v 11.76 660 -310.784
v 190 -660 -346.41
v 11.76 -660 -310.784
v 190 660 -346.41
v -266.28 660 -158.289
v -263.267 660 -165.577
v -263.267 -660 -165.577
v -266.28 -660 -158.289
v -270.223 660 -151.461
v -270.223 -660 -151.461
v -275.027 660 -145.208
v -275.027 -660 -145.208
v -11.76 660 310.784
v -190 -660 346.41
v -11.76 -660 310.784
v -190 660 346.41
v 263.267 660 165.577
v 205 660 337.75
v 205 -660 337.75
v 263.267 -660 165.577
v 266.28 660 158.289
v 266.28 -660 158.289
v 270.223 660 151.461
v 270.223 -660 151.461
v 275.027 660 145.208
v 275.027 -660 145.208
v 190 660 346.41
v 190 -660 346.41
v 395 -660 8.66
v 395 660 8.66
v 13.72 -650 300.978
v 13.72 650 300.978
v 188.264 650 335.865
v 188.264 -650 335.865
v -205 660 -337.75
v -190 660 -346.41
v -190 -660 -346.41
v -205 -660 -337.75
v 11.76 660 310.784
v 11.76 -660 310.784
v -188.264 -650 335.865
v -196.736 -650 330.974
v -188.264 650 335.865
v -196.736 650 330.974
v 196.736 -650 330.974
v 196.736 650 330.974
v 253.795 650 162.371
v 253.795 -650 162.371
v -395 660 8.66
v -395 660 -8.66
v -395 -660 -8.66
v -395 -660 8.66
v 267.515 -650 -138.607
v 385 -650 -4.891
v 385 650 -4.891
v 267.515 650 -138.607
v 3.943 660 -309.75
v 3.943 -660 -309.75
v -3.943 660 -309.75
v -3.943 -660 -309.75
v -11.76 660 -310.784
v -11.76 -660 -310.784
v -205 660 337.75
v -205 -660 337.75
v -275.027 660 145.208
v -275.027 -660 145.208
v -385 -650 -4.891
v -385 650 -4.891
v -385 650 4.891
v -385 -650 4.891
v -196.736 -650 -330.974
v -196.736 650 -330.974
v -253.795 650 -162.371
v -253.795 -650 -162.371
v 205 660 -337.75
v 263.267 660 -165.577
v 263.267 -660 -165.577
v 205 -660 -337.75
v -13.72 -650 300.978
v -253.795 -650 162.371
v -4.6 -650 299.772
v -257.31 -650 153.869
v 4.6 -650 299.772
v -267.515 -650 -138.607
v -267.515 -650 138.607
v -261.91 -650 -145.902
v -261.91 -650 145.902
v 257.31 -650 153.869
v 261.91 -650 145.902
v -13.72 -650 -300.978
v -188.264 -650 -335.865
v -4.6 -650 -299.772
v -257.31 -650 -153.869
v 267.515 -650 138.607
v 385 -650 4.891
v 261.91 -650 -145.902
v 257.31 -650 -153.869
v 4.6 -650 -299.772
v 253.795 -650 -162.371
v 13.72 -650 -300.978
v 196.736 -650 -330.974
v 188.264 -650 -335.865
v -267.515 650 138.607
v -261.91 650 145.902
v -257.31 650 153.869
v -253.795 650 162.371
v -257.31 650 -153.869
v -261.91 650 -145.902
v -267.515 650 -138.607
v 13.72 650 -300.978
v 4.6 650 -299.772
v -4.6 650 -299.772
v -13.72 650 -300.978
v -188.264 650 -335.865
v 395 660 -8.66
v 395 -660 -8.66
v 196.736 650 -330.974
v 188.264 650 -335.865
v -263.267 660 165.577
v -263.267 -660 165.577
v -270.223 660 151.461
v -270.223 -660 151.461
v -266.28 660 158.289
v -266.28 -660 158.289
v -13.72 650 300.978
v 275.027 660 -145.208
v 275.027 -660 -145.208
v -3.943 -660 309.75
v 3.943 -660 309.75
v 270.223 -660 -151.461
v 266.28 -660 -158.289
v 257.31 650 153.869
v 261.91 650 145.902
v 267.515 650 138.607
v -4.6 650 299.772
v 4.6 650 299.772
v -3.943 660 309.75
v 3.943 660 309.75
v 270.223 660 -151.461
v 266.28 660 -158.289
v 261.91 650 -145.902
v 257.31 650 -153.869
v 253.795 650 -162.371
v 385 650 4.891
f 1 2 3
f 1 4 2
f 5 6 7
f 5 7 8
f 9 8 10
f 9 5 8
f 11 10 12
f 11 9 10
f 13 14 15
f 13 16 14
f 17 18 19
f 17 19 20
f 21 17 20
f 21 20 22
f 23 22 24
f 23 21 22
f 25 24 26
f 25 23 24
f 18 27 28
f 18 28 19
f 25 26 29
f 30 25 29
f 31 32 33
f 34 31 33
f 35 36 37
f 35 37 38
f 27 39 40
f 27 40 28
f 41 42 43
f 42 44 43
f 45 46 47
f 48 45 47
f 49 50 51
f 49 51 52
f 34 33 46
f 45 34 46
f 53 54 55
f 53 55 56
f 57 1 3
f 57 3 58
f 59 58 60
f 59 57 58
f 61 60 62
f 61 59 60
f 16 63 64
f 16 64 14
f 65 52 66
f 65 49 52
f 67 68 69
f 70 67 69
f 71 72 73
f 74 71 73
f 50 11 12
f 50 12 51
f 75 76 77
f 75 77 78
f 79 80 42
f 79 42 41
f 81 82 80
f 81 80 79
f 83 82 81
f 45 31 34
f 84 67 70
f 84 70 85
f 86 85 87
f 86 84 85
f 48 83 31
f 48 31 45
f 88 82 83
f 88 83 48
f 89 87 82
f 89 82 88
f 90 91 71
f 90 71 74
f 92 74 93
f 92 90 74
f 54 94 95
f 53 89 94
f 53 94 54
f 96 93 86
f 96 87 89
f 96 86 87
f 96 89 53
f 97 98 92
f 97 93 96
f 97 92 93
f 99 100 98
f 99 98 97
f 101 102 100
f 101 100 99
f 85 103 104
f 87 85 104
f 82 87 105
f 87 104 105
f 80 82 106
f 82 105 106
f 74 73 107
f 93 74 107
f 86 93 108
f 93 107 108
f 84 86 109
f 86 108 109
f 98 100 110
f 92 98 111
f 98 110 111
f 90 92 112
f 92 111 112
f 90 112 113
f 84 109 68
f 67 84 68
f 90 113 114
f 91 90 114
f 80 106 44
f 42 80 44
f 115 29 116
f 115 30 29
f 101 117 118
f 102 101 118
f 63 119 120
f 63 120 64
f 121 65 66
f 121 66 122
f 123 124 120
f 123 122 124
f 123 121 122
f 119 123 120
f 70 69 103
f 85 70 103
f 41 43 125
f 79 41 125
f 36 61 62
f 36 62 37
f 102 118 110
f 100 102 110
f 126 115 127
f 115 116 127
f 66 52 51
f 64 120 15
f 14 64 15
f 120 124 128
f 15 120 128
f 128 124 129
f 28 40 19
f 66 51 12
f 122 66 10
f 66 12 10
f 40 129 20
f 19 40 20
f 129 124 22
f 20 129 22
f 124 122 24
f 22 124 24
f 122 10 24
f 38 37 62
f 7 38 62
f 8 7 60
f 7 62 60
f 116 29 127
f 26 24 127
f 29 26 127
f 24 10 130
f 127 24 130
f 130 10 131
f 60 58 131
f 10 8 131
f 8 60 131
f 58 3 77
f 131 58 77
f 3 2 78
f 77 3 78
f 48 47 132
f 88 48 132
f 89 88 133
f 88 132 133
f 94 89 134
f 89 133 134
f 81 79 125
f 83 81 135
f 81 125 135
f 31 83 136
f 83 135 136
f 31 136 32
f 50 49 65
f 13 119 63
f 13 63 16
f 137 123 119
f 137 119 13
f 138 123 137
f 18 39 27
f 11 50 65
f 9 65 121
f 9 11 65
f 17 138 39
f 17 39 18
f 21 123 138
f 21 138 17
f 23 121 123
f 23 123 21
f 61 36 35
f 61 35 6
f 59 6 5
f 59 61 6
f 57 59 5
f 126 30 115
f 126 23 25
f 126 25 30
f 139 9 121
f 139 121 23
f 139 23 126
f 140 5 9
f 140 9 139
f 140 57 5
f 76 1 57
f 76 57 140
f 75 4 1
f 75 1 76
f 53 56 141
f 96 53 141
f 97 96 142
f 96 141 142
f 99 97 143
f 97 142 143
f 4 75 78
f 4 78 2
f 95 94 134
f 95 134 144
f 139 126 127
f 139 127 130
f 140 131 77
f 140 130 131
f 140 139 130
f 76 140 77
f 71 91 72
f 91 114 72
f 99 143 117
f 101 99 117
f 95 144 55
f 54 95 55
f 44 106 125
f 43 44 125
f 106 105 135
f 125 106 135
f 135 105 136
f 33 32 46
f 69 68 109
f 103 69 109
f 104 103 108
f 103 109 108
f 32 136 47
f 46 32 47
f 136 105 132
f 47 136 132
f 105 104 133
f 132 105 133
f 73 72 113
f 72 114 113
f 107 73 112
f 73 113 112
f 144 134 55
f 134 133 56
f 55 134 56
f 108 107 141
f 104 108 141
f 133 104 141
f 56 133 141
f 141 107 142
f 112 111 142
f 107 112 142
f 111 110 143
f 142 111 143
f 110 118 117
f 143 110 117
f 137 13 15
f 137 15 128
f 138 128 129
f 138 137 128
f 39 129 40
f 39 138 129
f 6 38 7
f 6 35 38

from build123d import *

# Parameters (mm, degrees)
EXTRUDE_1_DEPTH          = 660
CUT_EXTRUDE_1_DEPTH      = 661
CUT_EXTRUDE_1_DEPTH_BACK = 661
SHELL_1_T                = 10


with BuildPart() as part:
    # 草图1 → 凸台-拉伸1 (new body, symmetric)
    with BuildSketch(Plane(origin=(0, 0, 0), x_dir=(1, 0, 0), z_dir=(0, 1, 0))):
        Polygon((395, 8.660254038), (205, 337.749907476), (190, 346.410161514), (-190, 346.410161514), (-205, 337.749907476), (-395, 8.660254038), (-395, -8.660254038), (-205, -337.749907476), (-190, -346.410161514), (190, -346.410161514), (205, -337.749907476), (395, -8.660254038), align=None)
    extrude(amount=EXTRUDE_1_DEPTH, both=True)

    # 草图4 → 切除-拉伸1 (cut, two sides)
    with BuildSketch(Plane(origin=(0, 0, 0), x_dir=(1, 0, 0), z_dir=(0, 1, 0))) as cut_extrude_1_sk:
        with BuildLine():
            Line((190, 369.620348729), (190, 346.410161514))
            Line((190, 346.410161514), (11.76, 310.784114995))
            ThreePointArc((11.76, 310.784114995), (0, 309.620348729), (-11.76, 310.784114995))
            Line((-11.76, 310.784114995), (-190, 346.410161514))
            Line((-190, 346.410161514), (-190, 369.620348729))
            Line((-190, 369.620348729), (-190, 392.830535944))
            Line((-190, 392.830535944), (-11.76, 428.456582463))
            ThreePointArc((-11.76, 428.456582463), (0, 429.620348729), (11.76, 428.456582463))
            Line((11.76, 428.456582463), (190, 392.830535944))
            Line((190, 392.830535944), (190, 369.620348729))
        make_face()
        with BuildLine():
            Line((415.100611755, 20.265347645), (395, 8.660254038))
            Line((395, 8.660254038), (275.026938678, 145.207598749))
            ThreePointArc((275.026938678, 145.207598749), (268.139087528, 154.810174364), (263.266938678, 165.576516246))
            Line((263.266938678, 165.576516246), (205, 337.749907476))
            Line((205, 337.749907476), (225.100611755, 349.355001084))
            Line((225.100611755, 349.355001084), (245.20122351, 360.960094691))
            Line((245.20122351, 360.960094691), (365.174284832, 224.41274998))
            ThreePointArc((365.174284832, 224.41274998), (372.062135982, 214.810174364), (376.934284832, 204.043832483))
            Line((376.934284832, 204.043832483), (435.20122351, 31.870441253))
            Line((435.20122351, 31.870441253), (415.100611755, 20.265347645))
        make_face()
        with BuildLine():
            Line((225.100611755, -349.355001084), (205, -337.749907476))
            Line((205, -337.749907476), (263.266938678, -165.576516246))
            ThreePointArc((263.266938678, -165.576516246), (268.139087528, -154.810174364), (275.026938678, -145.207598749))
            Line((275.026938678, -145.207598749), (395, -8.660254038))
            Line((395, -8.660254038), (415.100611755, -20.265347645))
            Line((415.100611755, -20.265347645), (435.20122351, -31.870441253))
            Line((435.20122351, -31.870441253), (376.934284832, -204.043832483))
            ThreePointArc((376.934284832, -204.043832483), (372.062135982, -214.810174364), (365.174284832, -224.41274998))
            Line((365.174284832, -224.41274998), (245.20122351, -360.960094691))
            Line((245.20122351, -360.960094691), (225.100611755, -349.355001084))
        make_face()
        with BuildLine():
            Line((-190, -369.620348729), (-190, -346.410161514))
            Line((-190, -346.410161514), (-11.76, -310.784114995))
            ThreePointArc((-11.76, -310.784114995), (0, -309.620348729), (11.76, -310.784114995))
            Line((11.76, -310.784114995), (190, -346.410161514))
            Line((190, -346.410161514), (190, -369.620348729))
            Line((190, -369.620348729), (190, -392.830535944))
            Line((190, -392.830535944), (11.76, -428.456582463))
            ThreePointArc((11.76, -428.456582463), (0, -429.620348729), (-11.76, -428.456582463))
            Line((-11.76, -428.456582463), (-190, -392.830535944))
            Line((-190, -392.830535944), (-190, -369.620348729))
        make_face()
        with BuildLine():
            Line((-415.100611755, -20.265347645), (-395, -8.660254038))
            Line((-395, -8.660254038), (-275.026938678, -145.207598749))
            ThreePointArc((-275.026938678, -145.207598749), (-268.139087528, -154.810174364), (-263.266938678, -165.576516246))
            Line((-263.266938678, -165.576516246), (-205, -337.749907476))
            Line((-205, -337.749907476), (-225.100611755, -349.355001084))
            Line((-225.100611755, -349.355001084), (-245.20122351, -360.960094691))
            Line((-245.20122351, -360.960094691), (-365.174284832, -224.41274998))
            ThreePointArc((-365.174284832, -224.41274998), (-372.062135982, -214.810174364), (-376.934284832, -204.043832483))
            Line((-376.934284832, -204.043832483), (-435.20122351, -31.870441253))
            Line((-435.20122351, -31.870441253), (-415.100611755, -20.265347645))
        make_face()
        with BuildLine():
            Line((-225.100611755, 349.355001084), (-205, 337.749907476))
            Line((-205, 337.749907476), (-263.266938678, 165.576516246))
            ThreePointArc((-263.266938678, 165.576516246), (-268.139087528, 154.810174364), (-275.026938678, 145.207598749))
            Line((-275.026938678, 145.207598749), (-395, 8.660254038))
            Line((-395, 8.660254038), (-415.100611755, 20.265347645))
            Line((-415.100611755, 20.265347645), (-435.20122351, 31.870441253))
            Line((-435.20122351, 31.870441253), (-376.934284832, 204.043832483))
            ThreePointArc((-376.934284832, 204.043832483), (-372.062135982, 214.810174364), (-365.174284832, 224.41274998))
            Line((-365.174284832, 224.41274998), (-245.20122351, 360.960094691))
            Line((-245.20122351, 360.960094691), (-225.100611755, 349.355001084))
        make_face()
    extrude(amount=CUT_EXTRUDE_1_DEPTH, mode=Mode.SUBTRACT)
    extrude(cut_extrude_1_sk.sketch, amount=-CUT_EXTRUDE_1_DEPTH_BACK, mode=Mode.SUBTRACT)

    # 抽壳1 (no face opened: a closed hollow body)
    add(offset(amount=-SHELL_1_T, mode=Mode.PRIVATE), mode=Mode.SUBTRACT)


solid = part.part
